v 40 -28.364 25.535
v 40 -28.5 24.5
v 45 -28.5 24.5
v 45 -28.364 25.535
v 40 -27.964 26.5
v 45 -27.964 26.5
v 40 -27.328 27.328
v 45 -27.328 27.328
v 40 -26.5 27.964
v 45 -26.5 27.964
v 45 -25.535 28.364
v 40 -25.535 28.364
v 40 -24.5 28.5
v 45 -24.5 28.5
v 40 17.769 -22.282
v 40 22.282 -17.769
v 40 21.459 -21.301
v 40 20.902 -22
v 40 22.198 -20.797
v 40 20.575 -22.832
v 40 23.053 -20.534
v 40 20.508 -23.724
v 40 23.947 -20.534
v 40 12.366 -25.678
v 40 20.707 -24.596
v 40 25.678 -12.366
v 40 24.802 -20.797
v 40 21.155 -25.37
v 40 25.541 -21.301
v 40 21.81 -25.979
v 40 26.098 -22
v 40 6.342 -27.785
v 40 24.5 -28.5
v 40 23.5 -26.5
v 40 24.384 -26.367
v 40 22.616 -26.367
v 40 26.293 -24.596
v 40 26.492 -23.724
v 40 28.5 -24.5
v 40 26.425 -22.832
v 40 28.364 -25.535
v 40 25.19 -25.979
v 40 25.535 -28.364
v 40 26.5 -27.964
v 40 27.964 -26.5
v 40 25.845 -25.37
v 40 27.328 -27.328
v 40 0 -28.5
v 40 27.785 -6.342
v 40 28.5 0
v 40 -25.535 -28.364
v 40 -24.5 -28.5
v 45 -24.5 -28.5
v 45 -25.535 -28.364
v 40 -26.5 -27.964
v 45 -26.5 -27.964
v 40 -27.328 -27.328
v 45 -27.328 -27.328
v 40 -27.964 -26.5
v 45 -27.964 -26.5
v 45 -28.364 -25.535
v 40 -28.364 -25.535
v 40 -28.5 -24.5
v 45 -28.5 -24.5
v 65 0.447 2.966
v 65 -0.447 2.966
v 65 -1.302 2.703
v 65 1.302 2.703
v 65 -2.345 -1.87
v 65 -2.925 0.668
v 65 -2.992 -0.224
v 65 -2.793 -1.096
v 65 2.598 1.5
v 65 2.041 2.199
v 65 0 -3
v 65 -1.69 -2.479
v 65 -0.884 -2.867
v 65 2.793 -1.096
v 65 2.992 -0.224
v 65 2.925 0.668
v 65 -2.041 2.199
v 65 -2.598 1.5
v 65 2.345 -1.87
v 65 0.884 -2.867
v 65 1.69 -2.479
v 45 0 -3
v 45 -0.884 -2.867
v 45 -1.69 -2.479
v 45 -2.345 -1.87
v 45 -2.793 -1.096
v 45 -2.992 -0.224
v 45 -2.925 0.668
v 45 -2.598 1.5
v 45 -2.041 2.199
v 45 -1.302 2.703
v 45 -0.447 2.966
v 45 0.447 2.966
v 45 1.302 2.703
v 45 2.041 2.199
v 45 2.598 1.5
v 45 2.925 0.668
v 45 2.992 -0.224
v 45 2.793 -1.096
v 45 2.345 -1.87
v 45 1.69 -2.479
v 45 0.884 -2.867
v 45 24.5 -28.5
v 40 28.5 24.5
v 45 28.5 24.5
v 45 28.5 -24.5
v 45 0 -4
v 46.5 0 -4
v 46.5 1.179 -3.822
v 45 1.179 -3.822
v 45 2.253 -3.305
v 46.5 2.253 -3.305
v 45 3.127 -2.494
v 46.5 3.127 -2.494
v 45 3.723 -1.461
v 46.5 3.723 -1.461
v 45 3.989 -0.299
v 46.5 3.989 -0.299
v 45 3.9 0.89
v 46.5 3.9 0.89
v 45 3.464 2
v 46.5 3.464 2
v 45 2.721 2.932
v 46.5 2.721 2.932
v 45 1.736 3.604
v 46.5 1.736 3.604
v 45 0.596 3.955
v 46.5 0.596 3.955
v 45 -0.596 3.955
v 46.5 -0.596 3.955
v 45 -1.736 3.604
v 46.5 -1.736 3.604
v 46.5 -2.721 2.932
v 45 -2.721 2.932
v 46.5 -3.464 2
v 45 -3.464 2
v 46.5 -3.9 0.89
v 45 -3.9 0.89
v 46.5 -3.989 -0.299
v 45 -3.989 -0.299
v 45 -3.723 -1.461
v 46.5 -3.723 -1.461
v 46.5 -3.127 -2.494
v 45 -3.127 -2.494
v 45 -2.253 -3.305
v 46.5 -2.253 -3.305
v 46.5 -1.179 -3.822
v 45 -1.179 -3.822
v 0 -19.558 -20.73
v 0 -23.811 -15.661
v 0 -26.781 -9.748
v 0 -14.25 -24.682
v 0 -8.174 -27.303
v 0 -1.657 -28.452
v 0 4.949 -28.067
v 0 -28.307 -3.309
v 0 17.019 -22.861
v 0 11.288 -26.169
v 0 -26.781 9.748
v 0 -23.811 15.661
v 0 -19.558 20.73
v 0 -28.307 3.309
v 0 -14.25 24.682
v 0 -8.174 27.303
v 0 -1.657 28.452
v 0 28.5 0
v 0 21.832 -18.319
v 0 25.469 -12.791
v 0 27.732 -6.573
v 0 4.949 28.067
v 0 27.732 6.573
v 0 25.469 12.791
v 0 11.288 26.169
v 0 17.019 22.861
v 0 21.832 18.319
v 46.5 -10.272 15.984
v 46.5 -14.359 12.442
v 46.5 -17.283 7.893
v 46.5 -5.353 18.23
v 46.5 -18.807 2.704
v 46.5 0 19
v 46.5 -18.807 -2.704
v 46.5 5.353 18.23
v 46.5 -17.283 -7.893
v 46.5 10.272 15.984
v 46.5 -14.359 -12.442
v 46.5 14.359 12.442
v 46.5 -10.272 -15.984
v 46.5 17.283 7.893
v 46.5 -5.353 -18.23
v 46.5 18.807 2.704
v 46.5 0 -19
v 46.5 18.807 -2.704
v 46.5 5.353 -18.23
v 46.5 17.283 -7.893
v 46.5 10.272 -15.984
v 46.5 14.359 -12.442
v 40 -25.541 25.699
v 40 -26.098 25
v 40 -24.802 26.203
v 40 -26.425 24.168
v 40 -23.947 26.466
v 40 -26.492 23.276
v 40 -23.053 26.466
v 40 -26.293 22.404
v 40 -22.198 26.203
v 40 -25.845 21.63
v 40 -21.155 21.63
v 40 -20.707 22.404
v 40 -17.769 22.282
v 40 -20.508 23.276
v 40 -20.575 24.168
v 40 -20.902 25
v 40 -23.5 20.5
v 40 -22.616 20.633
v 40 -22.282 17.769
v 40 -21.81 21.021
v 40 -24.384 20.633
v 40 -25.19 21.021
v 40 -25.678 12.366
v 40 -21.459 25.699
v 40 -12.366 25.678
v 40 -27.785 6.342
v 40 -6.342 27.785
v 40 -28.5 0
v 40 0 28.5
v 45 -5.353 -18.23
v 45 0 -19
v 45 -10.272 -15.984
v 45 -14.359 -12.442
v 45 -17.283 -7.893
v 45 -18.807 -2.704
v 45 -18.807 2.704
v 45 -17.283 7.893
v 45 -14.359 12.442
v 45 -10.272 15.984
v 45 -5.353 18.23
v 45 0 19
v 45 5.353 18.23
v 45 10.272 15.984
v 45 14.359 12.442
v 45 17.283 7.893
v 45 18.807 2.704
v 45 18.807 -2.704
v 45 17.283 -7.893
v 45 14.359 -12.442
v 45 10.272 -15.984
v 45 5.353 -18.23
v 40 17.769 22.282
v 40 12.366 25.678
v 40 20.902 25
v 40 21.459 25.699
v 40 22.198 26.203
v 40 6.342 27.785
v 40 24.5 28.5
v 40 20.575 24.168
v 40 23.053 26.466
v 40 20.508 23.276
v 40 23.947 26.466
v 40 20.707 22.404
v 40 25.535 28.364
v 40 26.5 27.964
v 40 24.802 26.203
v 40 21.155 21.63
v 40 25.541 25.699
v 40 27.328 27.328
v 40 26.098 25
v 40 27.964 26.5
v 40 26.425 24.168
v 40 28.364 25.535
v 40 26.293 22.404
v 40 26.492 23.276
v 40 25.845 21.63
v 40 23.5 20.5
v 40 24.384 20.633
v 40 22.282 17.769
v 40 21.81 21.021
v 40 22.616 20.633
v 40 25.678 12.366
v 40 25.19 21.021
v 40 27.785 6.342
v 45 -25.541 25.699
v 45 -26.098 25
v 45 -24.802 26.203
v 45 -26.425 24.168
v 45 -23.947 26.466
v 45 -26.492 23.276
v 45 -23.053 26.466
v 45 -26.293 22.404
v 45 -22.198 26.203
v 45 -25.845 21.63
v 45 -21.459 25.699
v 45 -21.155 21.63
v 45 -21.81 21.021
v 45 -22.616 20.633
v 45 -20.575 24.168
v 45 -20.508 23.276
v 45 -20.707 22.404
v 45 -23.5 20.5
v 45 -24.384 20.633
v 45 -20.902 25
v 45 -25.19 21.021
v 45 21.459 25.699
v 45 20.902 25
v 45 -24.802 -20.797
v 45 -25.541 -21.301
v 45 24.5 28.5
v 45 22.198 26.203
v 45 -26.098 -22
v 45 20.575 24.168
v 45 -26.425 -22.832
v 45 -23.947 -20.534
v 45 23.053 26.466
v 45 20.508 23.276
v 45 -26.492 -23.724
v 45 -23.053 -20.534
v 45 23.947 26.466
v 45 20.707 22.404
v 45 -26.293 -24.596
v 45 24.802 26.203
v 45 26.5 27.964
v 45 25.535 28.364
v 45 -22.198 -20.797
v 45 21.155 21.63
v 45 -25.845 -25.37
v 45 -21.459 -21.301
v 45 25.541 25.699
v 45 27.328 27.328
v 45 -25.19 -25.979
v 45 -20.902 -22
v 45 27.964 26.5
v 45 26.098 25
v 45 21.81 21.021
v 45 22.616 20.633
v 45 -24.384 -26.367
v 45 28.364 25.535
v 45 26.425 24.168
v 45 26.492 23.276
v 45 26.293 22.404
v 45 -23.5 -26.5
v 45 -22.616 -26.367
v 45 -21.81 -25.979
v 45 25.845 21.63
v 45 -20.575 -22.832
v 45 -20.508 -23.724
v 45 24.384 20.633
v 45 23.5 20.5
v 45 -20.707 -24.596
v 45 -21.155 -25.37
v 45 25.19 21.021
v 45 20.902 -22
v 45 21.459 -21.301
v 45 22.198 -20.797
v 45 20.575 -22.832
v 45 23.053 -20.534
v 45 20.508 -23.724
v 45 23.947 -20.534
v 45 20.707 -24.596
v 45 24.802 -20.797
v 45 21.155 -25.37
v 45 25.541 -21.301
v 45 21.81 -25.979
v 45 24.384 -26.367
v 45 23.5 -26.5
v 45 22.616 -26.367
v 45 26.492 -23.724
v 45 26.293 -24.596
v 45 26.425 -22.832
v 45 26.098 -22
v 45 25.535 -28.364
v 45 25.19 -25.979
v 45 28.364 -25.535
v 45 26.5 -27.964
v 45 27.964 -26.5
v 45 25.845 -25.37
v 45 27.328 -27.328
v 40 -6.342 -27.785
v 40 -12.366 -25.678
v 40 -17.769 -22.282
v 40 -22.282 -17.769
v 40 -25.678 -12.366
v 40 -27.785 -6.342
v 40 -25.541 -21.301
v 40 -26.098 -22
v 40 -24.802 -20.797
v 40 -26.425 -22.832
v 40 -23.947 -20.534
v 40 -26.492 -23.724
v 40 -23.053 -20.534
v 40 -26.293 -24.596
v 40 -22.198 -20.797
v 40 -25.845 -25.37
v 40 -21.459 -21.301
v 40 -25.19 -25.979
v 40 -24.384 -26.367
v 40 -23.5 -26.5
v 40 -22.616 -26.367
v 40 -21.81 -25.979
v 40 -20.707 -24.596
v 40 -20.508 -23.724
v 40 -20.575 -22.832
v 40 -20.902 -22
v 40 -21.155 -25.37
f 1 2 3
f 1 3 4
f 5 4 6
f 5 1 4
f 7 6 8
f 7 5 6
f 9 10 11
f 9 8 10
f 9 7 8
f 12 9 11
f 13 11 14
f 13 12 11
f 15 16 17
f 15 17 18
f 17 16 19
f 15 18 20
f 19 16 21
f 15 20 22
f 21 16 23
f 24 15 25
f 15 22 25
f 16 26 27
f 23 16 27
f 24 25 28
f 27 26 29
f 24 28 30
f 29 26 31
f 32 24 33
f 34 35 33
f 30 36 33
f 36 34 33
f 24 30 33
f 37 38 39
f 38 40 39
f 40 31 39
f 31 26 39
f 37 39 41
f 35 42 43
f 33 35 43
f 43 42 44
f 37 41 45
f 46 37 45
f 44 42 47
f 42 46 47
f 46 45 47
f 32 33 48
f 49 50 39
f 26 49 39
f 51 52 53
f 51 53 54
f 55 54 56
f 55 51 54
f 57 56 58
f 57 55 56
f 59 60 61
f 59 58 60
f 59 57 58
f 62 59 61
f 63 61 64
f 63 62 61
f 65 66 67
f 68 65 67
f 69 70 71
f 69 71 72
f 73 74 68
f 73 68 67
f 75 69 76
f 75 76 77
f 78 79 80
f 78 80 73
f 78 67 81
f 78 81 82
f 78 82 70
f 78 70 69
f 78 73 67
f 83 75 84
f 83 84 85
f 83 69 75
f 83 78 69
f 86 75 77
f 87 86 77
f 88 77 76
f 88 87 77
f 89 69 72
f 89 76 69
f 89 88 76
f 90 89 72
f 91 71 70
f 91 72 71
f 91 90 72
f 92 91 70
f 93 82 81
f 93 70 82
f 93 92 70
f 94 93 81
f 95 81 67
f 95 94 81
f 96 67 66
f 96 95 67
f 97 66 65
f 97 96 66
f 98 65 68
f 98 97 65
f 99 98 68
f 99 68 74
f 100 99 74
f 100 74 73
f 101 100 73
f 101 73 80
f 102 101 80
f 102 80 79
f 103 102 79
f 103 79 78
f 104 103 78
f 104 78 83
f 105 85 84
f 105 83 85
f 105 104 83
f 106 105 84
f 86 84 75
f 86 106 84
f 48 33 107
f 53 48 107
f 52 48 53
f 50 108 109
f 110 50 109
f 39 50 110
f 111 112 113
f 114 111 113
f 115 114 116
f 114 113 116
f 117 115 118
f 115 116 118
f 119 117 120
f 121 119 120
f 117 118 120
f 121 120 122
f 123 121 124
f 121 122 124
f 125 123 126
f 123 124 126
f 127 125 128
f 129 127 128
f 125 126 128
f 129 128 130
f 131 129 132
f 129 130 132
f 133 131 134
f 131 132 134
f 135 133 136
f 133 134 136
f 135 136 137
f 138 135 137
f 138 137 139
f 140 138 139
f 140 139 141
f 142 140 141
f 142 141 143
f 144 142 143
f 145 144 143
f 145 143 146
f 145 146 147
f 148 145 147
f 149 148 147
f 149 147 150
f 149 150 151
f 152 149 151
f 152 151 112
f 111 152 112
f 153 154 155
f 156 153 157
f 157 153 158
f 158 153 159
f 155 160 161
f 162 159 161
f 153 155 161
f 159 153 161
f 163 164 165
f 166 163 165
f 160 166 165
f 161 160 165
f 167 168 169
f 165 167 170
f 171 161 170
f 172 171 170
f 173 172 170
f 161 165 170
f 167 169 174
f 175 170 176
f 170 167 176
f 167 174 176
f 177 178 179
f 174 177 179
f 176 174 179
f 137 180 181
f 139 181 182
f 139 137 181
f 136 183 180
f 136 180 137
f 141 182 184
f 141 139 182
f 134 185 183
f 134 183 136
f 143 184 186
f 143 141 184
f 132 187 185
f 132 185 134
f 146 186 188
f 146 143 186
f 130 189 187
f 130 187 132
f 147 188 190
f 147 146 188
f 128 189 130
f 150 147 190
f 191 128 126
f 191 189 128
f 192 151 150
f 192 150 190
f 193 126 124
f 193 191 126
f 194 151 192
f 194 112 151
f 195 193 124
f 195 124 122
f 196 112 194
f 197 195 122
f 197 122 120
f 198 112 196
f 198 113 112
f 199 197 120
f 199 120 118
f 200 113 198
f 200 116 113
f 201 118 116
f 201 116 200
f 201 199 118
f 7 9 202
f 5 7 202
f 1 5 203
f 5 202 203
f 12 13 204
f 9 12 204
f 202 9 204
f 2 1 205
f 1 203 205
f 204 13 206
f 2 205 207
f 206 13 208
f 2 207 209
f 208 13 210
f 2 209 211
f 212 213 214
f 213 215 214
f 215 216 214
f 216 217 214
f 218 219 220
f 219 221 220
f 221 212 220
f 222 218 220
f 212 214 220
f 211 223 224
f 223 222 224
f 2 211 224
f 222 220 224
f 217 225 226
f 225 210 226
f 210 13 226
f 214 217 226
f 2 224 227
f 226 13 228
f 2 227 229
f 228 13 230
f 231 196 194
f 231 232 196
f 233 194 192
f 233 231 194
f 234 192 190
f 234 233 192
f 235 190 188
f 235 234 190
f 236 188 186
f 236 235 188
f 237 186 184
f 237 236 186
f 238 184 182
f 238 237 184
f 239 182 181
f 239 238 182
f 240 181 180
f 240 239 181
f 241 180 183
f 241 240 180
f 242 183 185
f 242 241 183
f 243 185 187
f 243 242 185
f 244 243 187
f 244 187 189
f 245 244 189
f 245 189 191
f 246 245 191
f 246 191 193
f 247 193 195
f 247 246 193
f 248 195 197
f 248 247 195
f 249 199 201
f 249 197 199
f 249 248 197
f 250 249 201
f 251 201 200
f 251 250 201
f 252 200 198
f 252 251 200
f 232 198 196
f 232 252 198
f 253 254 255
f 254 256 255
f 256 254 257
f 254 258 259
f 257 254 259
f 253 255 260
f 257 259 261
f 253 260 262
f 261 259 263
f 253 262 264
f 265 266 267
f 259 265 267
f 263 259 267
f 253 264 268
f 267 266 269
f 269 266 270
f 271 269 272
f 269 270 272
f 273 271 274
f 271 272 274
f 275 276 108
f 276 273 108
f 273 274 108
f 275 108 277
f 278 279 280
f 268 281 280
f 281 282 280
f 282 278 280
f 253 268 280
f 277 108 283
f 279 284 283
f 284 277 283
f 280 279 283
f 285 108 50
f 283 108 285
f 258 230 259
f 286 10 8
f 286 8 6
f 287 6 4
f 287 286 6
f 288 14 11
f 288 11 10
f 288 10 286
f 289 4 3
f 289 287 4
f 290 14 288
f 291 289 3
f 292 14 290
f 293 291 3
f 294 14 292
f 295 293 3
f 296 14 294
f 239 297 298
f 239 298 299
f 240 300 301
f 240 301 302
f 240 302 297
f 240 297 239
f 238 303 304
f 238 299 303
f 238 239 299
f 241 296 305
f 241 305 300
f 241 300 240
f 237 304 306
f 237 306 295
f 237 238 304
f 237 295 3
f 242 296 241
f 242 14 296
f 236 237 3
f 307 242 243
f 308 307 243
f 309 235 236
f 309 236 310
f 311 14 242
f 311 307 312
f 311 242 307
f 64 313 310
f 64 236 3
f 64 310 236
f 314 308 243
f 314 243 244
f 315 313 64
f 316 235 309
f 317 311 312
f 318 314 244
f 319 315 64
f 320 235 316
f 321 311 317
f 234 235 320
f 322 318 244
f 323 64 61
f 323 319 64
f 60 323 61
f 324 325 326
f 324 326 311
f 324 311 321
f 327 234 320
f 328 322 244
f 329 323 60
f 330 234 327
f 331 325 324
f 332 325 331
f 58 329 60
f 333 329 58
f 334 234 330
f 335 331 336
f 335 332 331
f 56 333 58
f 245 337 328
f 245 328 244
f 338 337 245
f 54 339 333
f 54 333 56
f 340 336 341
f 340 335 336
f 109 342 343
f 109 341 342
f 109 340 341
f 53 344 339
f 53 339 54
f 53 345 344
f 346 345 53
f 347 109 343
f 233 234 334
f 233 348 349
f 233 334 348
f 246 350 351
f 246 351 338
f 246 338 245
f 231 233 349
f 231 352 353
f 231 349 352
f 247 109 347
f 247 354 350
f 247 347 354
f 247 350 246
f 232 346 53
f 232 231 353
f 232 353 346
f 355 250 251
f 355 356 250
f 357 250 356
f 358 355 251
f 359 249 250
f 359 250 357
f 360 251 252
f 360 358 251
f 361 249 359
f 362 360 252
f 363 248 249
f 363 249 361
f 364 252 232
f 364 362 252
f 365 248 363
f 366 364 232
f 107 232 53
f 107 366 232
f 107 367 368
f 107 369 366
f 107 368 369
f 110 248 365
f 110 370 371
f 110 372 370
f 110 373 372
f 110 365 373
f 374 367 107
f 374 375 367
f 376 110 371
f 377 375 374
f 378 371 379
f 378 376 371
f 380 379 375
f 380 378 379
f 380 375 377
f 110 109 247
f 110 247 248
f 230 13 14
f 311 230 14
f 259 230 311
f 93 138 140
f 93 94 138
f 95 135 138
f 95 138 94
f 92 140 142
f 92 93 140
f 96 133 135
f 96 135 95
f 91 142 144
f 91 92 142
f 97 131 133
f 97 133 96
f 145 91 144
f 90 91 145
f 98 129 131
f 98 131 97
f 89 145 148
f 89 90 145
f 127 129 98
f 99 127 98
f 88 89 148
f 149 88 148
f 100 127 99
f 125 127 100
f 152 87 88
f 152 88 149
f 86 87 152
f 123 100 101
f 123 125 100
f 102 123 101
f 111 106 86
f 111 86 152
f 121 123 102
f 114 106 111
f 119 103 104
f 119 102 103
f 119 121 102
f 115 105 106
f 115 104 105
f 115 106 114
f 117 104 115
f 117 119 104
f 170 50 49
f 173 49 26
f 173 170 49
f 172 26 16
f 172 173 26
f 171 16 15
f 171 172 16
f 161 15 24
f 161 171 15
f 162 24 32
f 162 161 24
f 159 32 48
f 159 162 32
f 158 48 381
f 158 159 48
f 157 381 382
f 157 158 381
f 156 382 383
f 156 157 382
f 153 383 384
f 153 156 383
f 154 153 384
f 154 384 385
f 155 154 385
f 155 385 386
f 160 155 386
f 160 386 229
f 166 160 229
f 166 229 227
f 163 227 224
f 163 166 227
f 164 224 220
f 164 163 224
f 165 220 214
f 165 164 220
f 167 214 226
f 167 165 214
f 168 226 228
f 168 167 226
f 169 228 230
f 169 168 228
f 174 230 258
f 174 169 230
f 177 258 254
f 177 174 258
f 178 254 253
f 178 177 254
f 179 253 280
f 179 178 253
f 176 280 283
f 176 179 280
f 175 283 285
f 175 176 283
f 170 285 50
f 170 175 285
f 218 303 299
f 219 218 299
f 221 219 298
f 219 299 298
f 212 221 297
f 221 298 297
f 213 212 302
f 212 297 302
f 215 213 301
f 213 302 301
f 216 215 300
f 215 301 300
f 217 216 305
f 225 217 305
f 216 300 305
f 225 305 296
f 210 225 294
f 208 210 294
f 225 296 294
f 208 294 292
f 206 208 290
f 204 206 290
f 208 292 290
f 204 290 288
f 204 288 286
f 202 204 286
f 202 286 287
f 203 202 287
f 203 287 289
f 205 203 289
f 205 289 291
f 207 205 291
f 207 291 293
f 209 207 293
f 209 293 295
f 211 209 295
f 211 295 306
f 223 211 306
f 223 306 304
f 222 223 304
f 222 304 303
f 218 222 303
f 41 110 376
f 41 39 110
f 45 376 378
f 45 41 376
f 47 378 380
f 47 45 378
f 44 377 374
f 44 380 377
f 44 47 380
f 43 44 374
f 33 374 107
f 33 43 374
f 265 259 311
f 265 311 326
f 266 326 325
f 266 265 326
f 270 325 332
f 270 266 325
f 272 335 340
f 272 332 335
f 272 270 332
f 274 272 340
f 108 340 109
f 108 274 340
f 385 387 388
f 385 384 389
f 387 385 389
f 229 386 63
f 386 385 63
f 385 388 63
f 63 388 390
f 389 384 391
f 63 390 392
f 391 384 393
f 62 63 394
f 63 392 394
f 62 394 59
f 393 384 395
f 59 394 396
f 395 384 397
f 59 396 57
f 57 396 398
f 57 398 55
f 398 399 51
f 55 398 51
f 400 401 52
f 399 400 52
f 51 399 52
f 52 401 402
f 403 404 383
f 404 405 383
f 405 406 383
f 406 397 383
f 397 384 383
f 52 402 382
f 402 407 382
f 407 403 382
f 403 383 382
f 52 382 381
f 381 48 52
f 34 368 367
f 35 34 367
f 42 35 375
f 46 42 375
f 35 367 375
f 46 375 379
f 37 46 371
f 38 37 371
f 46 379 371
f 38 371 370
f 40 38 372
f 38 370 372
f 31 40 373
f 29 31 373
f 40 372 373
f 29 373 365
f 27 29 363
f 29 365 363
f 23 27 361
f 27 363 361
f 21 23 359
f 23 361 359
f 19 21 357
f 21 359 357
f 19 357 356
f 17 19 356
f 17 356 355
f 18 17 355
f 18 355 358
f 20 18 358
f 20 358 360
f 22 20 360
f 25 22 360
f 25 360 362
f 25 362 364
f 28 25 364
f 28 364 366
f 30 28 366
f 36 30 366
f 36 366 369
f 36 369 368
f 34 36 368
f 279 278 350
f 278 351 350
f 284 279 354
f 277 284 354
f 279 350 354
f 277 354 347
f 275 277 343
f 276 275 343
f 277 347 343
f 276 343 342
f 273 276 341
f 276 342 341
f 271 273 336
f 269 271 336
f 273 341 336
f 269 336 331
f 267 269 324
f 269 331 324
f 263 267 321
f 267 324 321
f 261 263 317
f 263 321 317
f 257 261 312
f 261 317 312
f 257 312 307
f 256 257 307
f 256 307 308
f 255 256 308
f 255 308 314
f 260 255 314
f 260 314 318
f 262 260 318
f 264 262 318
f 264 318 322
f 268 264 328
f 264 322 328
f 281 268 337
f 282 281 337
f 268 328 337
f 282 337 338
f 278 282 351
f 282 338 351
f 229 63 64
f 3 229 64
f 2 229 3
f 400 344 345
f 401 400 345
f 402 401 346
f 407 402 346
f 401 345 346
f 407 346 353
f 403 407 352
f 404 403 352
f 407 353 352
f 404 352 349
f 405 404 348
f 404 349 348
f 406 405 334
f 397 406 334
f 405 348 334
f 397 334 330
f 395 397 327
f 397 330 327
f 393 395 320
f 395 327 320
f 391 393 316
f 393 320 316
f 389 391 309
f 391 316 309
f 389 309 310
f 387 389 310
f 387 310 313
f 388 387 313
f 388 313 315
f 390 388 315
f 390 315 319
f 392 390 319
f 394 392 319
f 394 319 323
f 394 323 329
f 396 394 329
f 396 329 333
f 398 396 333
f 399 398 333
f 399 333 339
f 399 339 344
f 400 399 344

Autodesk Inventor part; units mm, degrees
ref_plane "YZ Plane" through (0, 0, 0) normal (1, 0, 0) x (0, 1, 0)
ref_plane "XZ Plane" through (0, 0, 0) normal (0, 1, 0) x (-1, 0, 0)
ref_plane "XY Plane" through (0, 0, 0) normal (0, 0, 1) x (1, 0, 0)
sketch "Boceto1" plane through (0, 0, 0) normal (1, 0, 0) x (0, 1, 0)
  circle A0 centre (0, 0) radius 28.5
  dimension "d0" = 57
extrude "cuerpo" add sketch "Boceto1" along normal blind 40
sketch "Boceto2" plane through (40, 0, 0) normal (1, 0, 0) x (0, 0, -1)
  line L0 (-24.5, 28.5) -> (24.5, 28.5)
  line L1 (28.5, 24.5) -> (28.5, -24.5)
  line L2 (24.5, -28.5) -> (-24.5, -28.5)
  line L3 (-28.5, -24.5) -> (-28.5, 24.5)
  line L4 (-28.5, 28.5) -> (28.5, -28.5) construction
  line L5 (28.5, 28.5) -> (-28.5, -28.5) construction
  arc A0 (28.5, 24.5) -> (24.5, 28.5) centre (24.5, 24.5) ccw
  arc A1 (-24.5, 28.5) -> (-28.5, 24.5) centre (-24.5, 24.5) ccw
  arc A2 (-28.5, -24.5) -> (-24.5, -28.5) centre (-24.5, -24.5) ccw
  arc A3 (24.5, -28.5) -> (28.5, -24.5) centre (24.5, -24.5) ccw
  point P0 (0, 0)
  dimension "d3" = 57
  dimension "d4" = 57
  dimension "d16" = 4
extrude "cara" add sketch "Boceto2" along normal blind 5
sketch "Boceto3" plane through (45, 0, 0) normal (1, 0, 0) x (0, 0, -1)
  circle A0 centre (0, 0) radius 19
  dimension "d7" = 38
extrude "Extrusión3" add sketch "Boceto3" along normal blind 1.5
sketch "Boceto4" plane through (46.5, 0, 0) normal (1, 0, 0) x (0, 0, -1)
  circle A0 centre (0, 0) radius 4
  dimension "d10" = 8
extrude "Extrusión4" cut sketch "Boceto4" against normal blind 1.5
sketch "Boceto5" plane through (45, 0, 0) normal (1, 0, 0) x (0, 0, -1)
  circle A0 centre (0, 0) radius 3
  dimension "d13" = 6
extrude "Extrusión5" add sketch "Boceto5" along normal blind 20
sketch "Boceto6" plane through (45, 0, 0) normal (1, 0, 0) x (0, 0, -1)
  line L0 (24.5, 28.5) -> (-24.5, 28.5) projected
  line L1 (-28.5, 24.5) -> (-28.5, -24.5) projected
  line L2 (-28.5, 0) -> (28.2081, 0)
  line L3 (0, 28.5) -> (0, -28.5)
  line L4 (-24.5, -28.5) -> (24.5, -28.5) projected
  line L5 (-24.5, -28.5) -> (-23.5, -28.5)
  line L6 (0, -28.5) -> (-24.5, -28.5) projected
  line L7 (-23.5, -28.5) -> (-23.5, -23.5)
  circle A0 centre (-23.5, -23.5) radius 3
  circle A1 centre (23.5, -23.5) radius 3
  circle A2 centre (-23.5, 23.5) radius 3
  circle A3 centre (23.5, 23.5) radius 3
  point P0 (0, 0)
  dimension "d22" = 1
  dimension "d23" = 5
  dimension "d24" = 6
extrude "Extrusión6" cut sketch "Boceto6" against normal up to surface (5 mm away)
